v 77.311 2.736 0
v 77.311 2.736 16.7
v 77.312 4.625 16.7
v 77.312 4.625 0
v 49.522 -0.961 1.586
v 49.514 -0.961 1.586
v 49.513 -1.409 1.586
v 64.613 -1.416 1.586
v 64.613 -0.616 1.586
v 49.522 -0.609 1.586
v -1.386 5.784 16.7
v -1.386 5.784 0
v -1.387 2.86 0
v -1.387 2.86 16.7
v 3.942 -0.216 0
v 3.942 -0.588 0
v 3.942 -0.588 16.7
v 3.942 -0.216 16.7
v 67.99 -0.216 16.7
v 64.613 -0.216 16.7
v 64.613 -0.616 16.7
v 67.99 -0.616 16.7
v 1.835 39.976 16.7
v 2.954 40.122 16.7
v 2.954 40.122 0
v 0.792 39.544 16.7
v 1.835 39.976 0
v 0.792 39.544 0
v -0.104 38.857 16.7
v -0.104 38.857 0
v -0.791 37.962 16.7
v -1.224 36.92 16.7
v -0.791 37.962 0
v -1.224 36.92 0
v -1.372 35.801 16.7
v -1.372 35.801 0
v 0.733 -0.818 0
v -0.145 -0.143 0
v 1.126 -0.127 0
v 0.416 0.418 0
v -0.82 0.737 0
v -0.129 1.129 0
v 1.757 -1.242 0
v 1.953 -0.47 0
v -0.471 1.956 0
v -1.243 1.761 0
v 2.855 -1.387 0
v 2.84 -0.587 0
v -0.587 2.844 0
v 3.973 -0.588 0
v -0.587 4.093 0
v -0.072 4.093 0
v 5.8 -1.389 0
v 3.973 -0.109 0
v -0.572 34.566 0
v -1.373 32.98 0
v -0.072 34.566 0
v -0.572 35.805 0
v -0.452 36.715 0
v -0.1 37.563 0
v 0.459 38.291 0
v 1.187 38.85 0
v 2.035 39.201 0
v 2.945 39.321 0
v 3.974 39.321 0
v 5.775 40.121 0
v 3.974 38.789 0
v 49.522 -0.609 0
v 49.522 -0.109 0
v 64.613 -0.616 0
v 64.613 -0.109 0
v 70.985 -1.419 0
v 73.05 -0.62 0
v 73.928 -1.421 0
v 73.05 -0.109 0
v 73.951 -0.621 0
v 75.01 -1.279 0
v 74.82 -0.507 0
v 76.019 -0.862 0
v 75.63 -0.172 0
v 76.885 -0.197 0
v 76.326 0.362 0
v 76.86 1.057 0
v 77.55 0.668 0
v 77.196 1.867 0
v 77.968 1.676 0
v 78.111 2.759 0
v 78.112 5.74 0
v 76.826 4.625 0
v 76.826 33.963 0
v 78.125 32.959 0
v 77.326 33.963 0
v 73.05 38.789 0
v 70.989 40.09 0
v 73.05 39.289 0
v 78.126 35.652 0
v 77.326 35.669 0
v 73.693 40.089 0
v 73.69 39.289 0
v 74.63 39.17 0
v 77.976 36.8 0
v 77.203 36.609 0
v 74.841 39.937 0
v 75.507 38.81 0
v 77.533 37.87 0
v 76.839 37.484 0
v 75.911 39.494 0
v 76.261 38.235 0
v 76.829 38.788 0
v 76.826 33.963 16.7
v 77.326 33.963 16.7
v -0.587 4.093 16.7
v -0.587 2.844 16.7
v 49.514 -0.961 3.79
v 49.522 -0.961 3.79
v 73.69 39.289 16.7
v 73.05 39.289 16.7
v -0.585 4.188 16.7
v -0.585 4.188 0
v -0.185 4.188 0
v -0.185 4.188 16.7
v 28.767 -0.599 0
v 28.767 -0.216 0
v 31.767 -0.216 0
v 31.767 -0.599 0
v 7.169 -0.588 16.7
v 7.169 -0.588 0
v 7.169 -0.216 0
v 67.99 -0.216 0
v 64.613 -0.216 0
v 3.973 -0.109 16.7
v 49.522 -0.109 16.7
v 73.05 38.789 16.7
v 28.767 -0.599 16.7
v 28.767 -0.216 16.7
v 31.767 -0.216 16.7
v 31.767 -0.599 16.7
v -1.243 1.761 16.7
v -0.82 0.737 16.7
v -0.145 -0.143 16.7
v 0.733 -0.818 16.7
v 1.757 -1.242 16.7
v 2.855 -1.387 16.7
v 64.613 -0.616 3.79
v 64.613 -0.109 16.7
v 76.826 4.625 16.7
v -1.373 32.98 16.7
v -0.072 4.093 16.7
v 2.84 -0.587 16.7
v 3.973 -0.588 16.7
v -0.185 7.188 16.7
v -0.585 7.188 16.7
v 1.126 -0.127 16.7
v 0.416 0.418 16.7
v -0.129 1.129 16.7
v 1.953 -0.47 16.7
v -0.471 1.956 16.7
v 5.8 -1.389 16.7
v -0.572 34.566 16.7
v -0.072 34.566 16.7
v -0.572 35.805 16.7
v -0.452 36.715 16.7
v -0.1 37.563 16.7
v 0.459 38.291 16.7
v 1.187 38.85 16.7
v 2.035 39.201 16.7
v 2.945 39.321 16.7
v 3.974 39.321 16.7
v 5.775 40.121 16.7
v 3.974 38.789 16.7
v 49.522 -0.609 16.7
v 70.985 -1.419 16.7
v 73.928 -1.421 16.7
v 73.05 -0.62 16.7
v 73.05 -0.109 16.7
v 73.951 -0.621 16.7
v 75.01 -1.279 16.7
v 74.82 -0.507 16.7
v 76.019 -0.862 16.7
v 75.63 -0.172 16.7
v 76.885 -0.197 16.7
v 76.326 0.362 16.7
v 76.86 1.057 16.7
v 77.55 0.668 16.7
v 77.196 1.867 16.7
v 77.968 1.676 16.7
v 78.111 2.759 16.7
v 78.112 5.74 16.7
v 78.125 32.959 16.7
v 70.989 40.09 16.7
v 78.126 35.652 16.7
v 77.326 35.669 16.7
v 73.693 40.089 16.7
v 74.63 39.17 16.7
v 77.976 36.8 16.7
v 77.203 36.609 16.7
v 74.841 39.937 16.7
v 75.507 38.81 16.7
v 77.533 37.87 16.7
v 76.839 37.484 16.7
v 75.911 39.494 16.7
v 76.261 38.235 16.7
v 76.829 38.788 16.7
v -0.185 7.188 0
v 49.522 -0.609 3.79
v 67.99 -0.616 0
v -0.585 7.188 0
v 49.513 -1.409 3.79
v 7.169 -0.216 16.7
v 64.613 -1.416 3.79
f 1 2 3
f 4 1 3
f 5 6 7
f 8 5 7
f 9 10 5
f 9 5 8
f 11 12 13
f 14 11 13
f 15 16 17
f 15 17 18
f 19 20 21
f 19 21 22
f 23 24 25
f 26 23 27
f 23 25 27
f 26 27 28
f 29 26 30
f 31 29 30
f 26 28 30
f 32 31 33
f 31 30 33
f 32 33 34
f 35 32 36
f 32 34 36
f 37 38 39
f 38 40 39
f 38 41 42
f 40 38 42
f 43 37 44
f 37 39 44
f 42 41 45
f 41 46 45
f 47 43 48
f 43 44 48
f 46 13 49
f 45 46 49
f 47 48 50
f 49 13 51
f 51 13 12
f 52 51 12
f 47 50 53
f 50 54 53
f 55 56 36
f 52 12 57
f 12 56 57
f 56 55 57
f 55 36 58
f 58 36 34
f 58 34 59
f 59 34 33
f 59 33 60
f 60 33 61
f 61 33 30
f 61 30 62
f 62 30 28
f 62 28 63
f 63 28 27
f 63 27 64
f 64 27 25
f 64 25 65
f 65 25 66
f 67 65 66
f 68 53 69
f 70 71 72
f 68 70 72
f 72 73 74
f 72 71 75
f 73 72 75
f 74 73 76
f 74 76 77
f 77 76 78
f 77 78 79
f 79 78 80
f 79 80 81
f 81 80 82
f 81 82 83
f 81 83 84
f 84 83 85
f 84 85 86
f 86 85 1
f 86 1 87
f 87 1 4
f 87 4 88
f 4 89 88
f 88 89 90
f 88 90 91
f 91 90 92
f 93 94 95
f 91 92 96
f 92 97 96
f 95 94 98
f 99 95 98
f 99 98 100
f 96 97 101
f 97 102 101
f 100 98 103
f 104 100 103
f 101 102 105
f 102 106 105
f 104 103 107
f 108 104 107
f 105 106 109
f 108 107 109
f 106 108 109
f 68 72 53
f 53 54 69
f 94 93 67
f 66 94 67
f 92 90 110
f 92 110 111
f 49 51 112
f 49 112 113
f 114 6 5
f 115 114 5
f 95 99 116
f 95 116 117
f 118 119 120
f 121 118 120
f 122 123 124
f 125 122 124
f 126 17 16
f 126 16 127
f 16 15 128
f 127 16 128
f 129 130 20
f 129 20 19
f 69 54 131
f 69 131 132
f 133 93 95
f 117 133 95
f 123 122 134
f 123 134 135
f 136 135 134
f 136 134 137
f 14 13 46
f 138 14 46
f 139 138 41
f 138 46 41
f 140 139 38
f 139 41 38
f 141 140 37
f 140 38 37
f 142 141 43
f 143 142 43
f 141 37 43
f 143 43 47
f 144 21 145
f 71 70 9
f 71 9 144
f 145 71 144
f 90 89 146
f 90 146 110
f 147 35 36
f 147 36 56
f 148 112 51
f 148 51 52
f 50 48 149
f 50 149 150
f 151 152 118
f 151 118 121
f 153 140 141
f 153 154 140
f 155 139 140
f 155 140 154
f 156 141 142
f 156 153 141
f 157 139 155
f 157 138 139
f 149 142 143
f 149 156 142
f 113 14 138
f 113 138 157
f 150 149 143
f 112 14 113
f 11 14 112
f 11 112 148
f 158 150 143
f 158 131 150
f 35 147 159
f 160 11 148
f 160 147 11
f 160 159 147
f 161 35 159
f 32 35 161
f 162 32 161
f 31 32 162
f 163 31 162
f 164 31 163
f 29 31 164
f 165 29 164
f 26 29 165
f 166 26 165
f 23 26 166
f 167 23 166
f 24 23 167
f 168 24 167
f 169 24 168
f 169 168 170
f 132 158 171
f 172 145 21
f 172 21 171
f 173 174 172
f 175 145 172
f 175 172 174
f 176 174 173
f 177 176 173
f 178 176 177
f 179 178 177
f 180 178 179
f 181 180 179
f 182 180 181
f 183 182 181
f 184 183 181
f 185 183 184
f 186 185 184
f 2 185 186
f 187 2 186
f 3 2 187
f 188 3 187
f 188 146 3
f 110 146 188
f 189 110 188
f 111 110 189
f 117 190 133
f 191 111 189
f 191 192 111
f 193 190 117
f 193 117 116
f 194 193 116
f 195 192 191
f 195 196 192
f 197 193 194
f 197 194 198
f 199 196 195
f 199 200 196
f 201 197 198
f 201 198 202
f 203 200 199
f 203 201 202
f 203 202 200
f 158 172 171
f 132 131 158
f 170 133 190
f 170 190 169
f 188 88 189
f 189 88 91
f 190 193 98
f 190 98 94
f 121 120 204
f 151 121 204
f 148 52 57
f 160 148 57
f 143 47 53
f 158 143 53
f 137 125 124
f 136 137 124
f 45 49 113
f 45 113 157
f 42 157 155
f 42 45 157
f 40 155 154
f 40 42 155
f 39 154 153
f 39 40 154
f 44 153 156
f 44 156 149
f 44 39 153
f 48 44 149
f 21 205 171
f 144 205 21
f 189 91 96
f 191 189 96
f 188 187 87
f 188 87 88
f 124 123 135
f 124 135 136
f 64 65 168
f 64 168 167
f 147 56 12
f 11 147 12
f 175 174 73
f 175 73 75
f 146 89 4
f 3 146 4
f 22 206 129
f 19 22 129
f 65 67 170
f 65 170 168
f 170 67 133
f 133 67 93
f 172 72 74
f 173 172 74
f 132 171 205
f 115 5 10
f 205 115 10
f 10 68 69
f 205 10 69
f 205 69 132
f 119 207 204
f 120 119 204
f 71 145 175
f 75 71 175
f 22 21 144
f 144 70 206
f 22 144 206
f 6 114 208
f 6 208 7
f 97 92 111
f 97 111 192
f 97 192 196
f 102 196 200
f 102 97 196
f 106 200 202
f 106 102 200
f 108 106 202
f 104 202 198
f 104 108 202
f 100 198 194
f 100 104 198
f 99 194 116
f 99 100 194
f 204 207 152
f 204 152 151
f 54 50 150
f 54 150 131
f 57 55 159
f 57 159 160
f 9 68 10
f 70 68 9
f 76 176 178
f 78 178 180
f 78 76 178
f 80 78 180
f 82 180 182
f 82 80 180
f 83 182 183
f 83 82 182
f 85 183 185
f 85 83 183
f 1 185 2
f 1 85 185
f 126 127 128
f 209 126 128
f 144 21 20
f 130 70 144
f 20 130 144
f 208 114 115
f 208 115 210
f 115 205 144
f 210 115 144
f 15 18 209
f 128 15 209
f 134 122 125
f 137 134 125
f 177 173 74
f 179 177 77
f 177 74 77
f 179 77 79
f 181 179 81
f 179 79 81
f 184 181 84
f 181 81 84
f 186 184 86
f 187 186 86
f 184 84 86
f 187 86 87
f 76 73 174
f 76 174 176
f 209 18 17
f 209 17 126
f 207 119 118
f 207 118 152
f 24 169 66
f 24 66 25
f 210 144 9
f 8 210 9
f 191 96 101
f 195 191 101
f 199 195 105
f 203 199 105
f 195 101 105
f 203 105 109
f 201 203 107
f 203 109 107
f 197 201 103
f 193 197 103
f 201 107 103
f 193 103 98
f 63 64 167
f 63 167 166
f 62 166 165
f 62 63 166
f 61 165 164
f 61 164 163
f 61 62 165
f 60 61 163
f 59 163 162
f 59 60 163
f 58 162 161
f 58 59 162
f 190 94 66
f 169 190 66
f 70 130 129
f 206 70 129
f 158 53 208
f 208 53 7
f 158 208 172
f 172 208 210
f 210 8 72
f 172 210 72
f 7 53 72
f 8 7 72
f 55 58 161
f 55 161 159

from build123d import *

# Parameters (mm, degrees)
EXTRUDE_1_DEPTH     = 16.7
SKETCH_3_W          = 15.099715766
SKETCH_3_H          = 2.203775642
CUT_EXTRUDE_1_DEPTH = 5
SKETCH_4_W          = 0.38725248
SKETCH_4_H          = 3
SKETCH_4_W_2        = 3
SKETCH_4_H_2        = 0.383109263
SKETCH_4_W_3        = 0.4
SKETCH_4_W_4        = 0.388780164
SKETCH_4_H_3        = 0.4
SKETCH_4_H_4        = 0.38857705
SKETCH_4_W_5        = 3.37605038
SKETCH_4_W_6        = 2.722344729
SKETCH_4_H_5        = 0.392885085
SKETCH_4_W_7        = 3.226877137
SKETCH_4_H_6        = 0.371411749
EXTRUDE_2_DEPTH     = 16.7
EXTRUDE_START       = -16.7
SKETCH_6_W          = 0.796868143
SKETCH_6_H          = 29.338375801
SKETCH_6_W_2        = 8.436859724
SKETCH_6_H_2        = 0.85179164
SKETCH_6_W_3        = 45.549197179
SKETCH_6_W_4        = 1.179184796
SKETCH_6_H_3        = 30.473345103
SKETCH_6_W_5        = 69.07677303
SKETCH_6_H_4        = 1.021717215
EXTRUDE_3_DEPTH     = 16.7


with BuildPart() as part:
    # 草图1 → 凸台-拉伸1 (new body)
    with BuildSketch(Plane.XY):
        with BuildLine():
            Line((2.855494038, -1.387278341), (5.800401001, -1.388665967))
            Line((5.800401001, -1.388665967), (70.985308674, -1.419380793))
            Line((70.985308674, -1.419380793), (73.927675632, -1.420767222))
            ThreePointArc((73.927675632, -1.420767222), (76.884881883, -0.197484463), (78.110950942, 2.758567664))
            Line((78.110950942, 2.758567664), (78.112355975, 5.740415772))
            Line((78.112355975, 5.740415772), (78.125181077, 32.958640512))
            Line((78.125181077, 32.958640512), (78.126450001, 35.651629799))
            ThreePointArc((78.126450001, 35.651629799), (76.828856853, 38.788476566), (73.693234318, 40.089025273))
            Line((73.693234318, 40.089025273), (70.98932047, 40.090299344))
            Line((70.98932047, 40.090299344), (5.775052881, 40.121028004))
            Line((5.775052881, 40.121028004), (2.954100692, 40.122357224))
            ThreePointArc((2.954100692, 40.122357224), (-0.103921613, 38.857370731), (-1.371789395, 35.800541896))
            Line((-1.371789395, 35.800541896), (-1.373118614, 32.979589707))
            Line((-1.373118614, 32.979589707), (-1.385933032, 5.784037735))
            Line((-1.385933032, 5.784037735), (-1.387311048, 2.85952701))
            ThreePointArc((-1.387311048, 2.85952701), (-0.145450691, -0.14258937), (2.855494038, -1.387278341))
        make_face()
        with BuildLine():
            Line((70.988943514, 39.290299433), (5.774675925, 39.321028093))
            Line((5.774675925, 39.321028093), (2.945484428, 39.321028093))
            ThreePointArc((2.945484428, 39.321028093), (0.458983687, 38.291428909), (-0.57178701, 35.805413586))
            Line((-0.57178701, 35.805413586), (-0.587318509, 2.843504746))
            ThreePointArc((-0.587318509, 2.843504746), (0.415916655, 0.418249199), (2.840225686, -0.587271057))
            Line((2.840225686, -0.587271057), (73.950700839, -0.620777983))
            ThreePointArc((73.950700839, -0.620777983), (76.326093463, 0.361830803), (77.31094036, 2.736296371))
            Line((77.31094036, 2.736296371), (77.326458049, 35.668898432))
            ThreePointArc((77.326458049, 35.668898432), (76.260744014, 38.23512367), (73.689645726, 39.289026875))
            Line((73.689645726, 39.289026875), (70.988943514, 39.290299433))
        make_face(mode=Mode.SUBTRACT)
    extrude(amount=EXTRUDE_1_DEPTH)

    # 草图3 → 切除-拉伸1 (cut)
    with BuildSketch(Plane(origin=(-0.000276089, -0.585932626, 0), x_dir=(0.9999998889874869, -0.0004711953032664496, 0), z_dir=(0.0004711953032664496, 0.9999998889874869, 0))):
        with Locations((57.063897747, -2.688044793)):
            Rectangle(SKETCH_3_W, SKETCH_3_H)
    extrude(amount=-CUT_EXTRUDE_1_DEPTH, mode=Mode.SUBTRACT)

    # 草图4 → 凸台-拉伸2 (add)
    with BuildSketch(Plane.XY):
        with Locations((77.118267417, 6.259444326)):
            Rectangle(SKETCH_4_W, SKETCH_4_H)
        with Locations((30.266902253, -0.407932956)):
            Rectangle(SKETCH_4_W_2, SKETCH_4_H_2)
        with Locations((-0.385271584, 5.687615959)):
            Rectangle(SKETCH_4_W_3, SKETCH_4_H)
        with Locations((-0.379661666, 32.499046592)):
            Rectangle(SKETCH_4_W_4, SKETCH_4_H)
        with Locations((24.872797996, 39.11273594)):
            Rectangle(SKETCH_4_W_2, SKETCH_4_H_3)
        with Locations((49.115290001, 39.107024465)):
            Rectangle(SKETCH_4_W_2, SKETCH_4_H_4)
        with Locations((77.124641177, 30.313021772)):
            Rectangle(SKETCH_4_W_3, SKETCH_4_H)
        with Locations((66.301497558, -0.416378324)):
            Rectangle(SKETCH_4_W_5, SKETCH_4_H_3)
        with Locations((48.152585915, -0.412820867)):
            Rectangle(SKETCH_4_W_6, SKETCH_4_H_5)
        with Locations((5.555152303, -0.402084199)):
            Rectangle(SKETCH_4_W_7, SKETCH_4_H_6)
    extrude(amount=EXTRUDE_2_DEPTH)


with BuildPart() as extrude_2_piece_1:
    # of the separate pieces the step leaves, piece 1, a body of its own (extrude_2_pieces)
    add(part.part.solids().sort_by_distance((73.693234318, 40.089025273, 0))[0])



with BuildPart() as extrude_2_piece_2:
    # of the separate pieces the step leaves, piece 2, a body of its own (extrude_2_pieces)
    add(part.part.solids().sort_by_distance((67.989522748, -0.616378324, 0))[0])


with BuildPart() as extrude_2_piece_3:
    # of the separate pieces the step leaves, piece 3, a body of its own (extrude_2_pieces)
    add(part.part.solids().sort_by_distance((-0.185271584, 7.187615959, 0))[0])


with BuildPart() as extrude_2_piece_4:
    # of the separate pieces the step leaves, piece 4, a body of its own (extrude_2_pieces)
    add(part.part.solids().sort_by_distance((7.168590872, -0.587790073, 0))[0])


with BuildPart() as extrude_2_piece_5:
    # of the separate pieces the step leaves, piece 5, a body of its own (extrude_2_pieces)
    add(part.part.solids().sort_by_distance((76.924641177, 4.759444326, 0))[0])


with BuildPart() as extrude_2_piece_6:
    # of the separate pieces the step leaves, piece 6, a body of its own (extrude_2_pieces)
    add(part.part.solids().sort_by_distance((31.766902253, -0.599487587, 0))[0])


with BuildPart() as extrude_2_piece_1_1:
    add(extrude_2_piece_1.part)

    add(extrude_2_piece_5.part)  # 凸台-拉伸3 merges 凸台-拉伸2 piece 5
    # 草图6 → 凸台-拉伸3 (add)
    with BuildSketch(Plane.XY.offset(16.7).offset(EXTRUDE_START)):
        with Locations((77.22408829, 19.293888192)):
            Rectangle(SKETCH_6_W, SKETCH_6_H)
        with Locations((68.83190223, -0.535163223)):
            Rectangle(SKETCH_6_W_2, SKETCH_6_H_2)
        with Locations((26.747754173, -0.535163223)):
            Rectangle(SKETCH_6_W_3, SKETCH_6_H_2)
        with Locations((-0.661963251, 19.329556786)):
            Rectangle(SKETCH_6_W_4, SKETCH_6_H_3)
        with Locations((38.511945577, 39.300186669)):
            Rectangle(SKETCH_6_W_5, SKETCH_6_H_4)
    extrude(amount=EXTRUDE_3_DEPTH)


solid = Compound([extrude_2_piece_2.part, extrude_2_piece_3.part, extrude_2_piece_4.part, extrude_2_piece_6.part, extrude_2_piece_1_1.part])
